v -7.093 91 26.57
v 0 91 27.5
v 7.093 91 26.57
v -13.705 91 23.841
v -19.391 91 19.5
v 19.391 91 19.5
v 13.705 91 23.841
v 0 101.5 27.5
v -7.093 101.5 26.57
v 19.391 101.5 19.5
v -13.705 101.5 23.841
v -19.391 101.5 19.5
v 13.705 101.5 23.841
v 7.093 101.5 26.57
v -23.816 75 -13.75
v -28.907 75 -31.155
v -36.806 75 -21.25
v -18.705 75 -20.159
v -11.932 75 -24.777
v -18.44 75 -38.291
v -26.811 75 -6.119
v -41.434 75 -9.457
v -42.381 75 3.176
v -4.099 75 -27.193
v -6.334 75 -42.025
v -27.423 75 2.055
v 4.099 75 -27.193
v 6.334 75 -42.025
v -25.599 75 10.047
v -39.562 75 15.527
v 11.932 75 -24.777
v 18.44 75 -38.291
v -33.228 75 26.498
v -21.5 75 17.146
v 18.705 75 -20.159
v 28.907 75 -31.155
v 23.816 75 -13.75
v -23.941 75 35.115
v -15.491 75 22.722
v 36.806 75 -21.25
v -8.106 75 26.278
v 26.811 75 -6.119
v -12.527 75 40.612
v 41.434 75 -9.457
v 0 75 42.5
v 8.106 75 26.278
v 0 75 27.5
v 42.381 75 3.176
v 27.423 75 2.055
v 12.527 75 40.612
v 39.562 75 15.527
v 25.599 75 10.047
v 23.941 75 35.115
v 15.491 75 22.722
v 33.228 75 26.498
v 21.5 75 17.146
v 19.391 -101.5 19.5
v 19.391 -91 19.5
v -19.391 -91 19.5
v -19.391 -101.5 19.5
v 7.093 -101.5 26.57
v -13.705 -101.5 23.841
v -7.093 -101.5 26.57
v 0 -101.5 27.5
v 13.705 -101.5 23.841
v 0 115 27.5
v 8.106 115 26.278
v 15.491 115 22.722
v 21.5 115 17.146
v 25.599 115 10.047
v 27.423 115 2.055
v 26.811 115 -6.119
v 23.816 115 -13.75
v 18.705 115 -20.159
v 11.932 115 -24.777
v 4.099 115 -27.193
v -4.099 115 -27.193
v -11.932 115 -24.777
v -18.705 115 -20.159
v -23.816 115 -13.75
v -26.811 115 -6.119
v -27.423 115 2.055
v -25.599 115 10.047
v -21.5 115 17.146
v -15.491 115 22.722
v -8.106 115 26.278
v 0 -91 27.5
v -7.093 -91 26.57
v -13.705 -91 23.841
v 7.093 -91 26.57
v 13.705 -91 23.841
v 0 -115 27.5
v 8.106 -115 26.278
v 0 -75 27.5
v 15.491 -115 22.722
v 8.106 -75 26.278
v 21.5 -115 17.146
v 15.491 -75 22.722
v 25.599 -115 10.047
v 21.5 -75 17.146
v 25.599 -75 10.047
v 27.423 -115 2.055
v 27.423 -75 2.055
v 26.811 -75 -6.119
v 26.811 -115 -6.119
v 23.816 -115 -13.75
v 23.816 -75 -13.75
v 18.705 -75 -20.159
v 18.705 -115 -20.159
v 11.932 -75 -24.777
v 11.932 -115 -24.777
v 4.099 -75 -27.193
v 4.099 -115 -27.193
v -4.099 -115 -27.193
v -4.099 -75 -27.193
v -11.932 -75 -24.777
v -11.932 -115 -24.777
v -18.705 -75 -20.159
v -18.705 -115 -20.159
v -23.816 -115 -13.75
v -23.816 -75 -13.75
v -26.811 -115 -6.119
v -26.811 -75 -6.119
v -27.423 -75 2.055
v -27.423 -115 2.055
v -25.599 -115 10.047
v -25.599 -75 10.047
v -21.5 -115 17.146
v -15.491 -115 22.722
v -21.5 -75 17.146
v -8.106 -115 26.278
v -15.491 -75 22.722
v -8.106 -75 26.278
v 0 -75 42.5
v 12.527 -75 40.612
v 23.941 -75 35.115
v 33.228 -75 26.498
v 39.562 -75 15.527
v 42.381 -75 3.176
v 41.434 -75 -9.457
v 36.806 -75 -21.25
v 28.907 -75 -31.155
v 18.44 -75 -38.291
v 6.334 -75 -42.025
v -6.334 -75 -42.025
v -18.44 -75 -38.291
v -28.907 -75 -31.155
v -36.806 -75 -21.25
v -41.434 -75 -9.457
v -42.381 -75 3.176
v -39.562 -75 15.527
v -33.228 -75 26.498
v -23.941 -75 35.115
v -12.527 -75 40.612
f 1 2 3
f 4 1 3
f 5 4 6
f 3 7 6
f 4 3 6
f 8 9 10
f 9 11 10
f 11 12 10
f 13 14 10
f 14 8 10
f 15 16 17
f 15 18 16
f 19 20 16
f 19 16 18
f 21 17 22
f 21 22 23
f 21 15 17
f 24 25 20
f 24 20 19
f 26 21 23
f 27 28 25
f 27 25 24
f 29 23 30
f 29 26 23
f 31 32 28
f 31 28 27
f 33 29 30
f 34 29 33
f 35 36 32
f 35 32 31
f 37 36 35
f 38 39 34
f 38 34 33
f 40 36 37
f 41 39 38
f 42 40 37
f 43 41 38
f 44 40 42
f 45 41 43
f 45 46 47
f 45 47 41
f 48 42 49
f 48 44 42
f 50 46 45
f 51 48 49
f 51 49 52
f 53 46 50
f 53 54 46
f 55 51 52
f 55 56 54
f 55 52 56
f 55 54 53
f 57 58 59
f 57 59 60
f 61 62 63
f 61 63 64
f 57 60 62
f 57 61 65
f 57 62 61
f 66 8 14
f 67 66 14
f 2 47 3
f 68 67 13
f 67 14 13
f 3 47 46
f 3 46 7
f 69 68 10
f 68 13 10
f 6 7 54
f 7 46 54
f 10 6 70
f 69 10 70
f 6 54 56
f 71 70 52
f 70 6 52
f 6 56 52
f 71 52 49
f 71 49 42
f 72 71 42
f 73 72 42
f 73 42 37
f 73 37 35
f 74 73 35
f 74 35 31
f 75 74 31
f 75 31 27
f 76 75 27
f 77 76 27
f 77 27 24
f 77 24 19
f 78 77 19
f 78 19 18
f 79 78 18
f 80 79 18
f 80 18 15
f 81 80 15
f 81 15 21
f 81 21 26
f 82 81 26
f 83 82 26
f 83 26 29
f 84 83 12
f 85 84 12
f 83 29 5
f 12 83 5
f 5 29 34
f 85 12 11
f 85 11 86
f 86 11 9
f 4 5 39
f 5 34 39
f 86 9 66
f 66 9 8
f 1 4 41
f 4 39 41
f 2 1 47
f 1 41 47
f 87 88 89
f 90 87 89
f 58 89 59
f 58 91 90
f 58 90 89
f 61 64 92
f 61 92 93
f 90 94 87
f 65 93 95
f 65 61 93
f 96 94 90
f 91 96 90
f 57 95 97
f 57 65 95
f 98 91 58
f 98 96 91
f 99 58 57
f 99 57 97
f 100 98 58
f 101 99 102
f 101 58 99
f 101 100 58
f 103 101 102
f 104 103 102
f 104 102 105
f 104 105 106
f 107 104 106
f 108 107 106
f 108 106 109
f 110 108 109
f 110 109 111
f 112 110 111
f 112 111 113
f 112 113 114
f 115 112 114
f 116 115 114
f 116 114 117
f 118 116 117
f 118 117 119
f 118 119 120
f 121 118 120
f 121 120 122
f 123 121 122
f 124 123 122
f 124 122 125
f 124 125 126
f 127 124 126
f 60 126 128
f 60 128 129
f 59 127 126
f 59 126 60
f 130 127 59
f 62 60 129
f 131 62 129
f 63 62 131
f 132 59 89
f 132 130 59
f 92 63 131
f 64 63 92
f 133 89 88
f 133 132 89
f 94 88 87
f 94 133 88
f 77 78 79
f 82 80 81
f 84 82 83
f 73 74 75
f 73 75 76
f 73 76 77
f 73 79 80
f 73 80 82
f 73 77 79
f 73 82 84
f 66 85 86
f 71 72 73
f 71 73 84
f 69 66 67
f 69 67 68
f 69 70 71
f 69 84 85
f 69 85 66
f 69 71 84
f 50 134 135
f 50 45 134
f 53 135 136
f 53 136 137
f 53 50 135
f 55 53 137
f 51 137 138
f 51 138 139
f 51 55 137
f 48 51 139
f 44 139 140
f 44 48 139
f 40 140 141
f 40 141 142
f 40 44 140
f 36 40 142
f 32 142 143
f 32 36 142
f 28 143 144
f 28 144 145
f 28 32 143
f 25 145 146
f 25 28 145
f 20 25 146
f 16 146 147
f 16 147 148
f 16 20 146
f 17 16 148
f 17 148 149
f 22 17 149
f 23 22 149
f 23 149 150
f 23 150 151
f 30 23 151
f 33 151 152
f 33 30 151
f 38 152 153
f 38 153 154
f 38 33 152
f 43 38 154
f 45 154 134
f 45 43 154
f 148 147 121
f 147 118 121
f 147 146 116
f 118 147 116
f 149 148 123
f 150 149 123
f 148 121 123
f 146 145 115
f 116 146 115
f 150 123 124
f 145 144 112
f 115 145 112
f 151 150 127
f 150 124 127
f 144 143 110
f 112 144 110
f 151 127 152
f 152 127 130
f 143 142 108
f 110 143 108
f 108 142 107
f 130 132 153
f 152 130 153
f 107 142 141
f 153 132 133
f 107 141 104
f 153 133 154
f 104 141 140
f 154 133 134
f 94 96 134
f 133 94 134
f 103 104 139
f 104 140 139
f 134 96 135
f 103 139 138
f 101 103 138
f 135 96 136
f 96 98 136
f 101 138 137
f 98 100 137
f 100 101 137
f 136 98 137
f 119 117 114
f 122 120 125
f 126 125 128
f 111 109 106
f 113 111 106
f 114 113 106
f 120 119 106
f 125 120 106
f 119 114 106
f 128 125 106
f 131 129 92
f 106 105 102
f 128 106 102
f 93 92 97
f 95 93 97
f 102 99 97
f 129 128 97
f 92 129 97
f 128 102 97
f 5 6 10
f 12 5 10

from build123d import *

# Parameters (mm, degrees)
SKETCH1_R           = 42.5
BOSS_EXTRUDE1_DEPTH = 75
SKETCH2_R           = 27.5
BOSS_EXTRUDE2_DEPTH = 40
CUT_EXTRUDE1_DEPTH  = 130.759392724


with BuildPart() as part:
    # Sketch1 → Boss-Extrude1 (new, symmetric)
    with BuildSketch(Plane(origin=(0, 0, 0), x_dir=(-1, 0, 0), z_dir=(0, 1, 0))):
        with Locations(Location((0, 0, 0), (0, 0, 90))):
            Circle(SKETCH1_R)
    extrude(amount=BOSS_EXTRUDE1_DEPTH, both=True)

    # Sketch2 → Boss-Extrude2 (add)
    with BuildSketch(Plane(origin=(0, 75, 0), x_dir=(-1, 0, 0), z_dir=(0, 1, 0))):
        with Locations(Location((0, 0, 0), (0, 0, 90))):
            Circle(SKETCH2_R)
    boss_extrude2 = extrude(amount=BOSS_EXTRUDE2_DEPTH)

    # Sketch3 → Cut-Extrude1 (cut, symmetric)
    with BuildSketch(Plane.YZ):
        Polygon((91, 27.5), (91, 19.5), (101.5, 19.5), (101.5, 27.5), (101.5, 29.5), (91, 29.5), align=None)
    cut_extrude1 = extrude(amount=CUT_EXTRUDE1_DEPTH, both=True, mode=Mode.SUBTRACT)

    # Mirror1: Boss-Extrude2, Cut-Extrude1 across plane
    add(boss_extrude2.mirror(Plane.ZX))
    add(cut_extrude1.mirror(Plane.ZX), mode=Mode.SUBTRACT)


solid = part.part
